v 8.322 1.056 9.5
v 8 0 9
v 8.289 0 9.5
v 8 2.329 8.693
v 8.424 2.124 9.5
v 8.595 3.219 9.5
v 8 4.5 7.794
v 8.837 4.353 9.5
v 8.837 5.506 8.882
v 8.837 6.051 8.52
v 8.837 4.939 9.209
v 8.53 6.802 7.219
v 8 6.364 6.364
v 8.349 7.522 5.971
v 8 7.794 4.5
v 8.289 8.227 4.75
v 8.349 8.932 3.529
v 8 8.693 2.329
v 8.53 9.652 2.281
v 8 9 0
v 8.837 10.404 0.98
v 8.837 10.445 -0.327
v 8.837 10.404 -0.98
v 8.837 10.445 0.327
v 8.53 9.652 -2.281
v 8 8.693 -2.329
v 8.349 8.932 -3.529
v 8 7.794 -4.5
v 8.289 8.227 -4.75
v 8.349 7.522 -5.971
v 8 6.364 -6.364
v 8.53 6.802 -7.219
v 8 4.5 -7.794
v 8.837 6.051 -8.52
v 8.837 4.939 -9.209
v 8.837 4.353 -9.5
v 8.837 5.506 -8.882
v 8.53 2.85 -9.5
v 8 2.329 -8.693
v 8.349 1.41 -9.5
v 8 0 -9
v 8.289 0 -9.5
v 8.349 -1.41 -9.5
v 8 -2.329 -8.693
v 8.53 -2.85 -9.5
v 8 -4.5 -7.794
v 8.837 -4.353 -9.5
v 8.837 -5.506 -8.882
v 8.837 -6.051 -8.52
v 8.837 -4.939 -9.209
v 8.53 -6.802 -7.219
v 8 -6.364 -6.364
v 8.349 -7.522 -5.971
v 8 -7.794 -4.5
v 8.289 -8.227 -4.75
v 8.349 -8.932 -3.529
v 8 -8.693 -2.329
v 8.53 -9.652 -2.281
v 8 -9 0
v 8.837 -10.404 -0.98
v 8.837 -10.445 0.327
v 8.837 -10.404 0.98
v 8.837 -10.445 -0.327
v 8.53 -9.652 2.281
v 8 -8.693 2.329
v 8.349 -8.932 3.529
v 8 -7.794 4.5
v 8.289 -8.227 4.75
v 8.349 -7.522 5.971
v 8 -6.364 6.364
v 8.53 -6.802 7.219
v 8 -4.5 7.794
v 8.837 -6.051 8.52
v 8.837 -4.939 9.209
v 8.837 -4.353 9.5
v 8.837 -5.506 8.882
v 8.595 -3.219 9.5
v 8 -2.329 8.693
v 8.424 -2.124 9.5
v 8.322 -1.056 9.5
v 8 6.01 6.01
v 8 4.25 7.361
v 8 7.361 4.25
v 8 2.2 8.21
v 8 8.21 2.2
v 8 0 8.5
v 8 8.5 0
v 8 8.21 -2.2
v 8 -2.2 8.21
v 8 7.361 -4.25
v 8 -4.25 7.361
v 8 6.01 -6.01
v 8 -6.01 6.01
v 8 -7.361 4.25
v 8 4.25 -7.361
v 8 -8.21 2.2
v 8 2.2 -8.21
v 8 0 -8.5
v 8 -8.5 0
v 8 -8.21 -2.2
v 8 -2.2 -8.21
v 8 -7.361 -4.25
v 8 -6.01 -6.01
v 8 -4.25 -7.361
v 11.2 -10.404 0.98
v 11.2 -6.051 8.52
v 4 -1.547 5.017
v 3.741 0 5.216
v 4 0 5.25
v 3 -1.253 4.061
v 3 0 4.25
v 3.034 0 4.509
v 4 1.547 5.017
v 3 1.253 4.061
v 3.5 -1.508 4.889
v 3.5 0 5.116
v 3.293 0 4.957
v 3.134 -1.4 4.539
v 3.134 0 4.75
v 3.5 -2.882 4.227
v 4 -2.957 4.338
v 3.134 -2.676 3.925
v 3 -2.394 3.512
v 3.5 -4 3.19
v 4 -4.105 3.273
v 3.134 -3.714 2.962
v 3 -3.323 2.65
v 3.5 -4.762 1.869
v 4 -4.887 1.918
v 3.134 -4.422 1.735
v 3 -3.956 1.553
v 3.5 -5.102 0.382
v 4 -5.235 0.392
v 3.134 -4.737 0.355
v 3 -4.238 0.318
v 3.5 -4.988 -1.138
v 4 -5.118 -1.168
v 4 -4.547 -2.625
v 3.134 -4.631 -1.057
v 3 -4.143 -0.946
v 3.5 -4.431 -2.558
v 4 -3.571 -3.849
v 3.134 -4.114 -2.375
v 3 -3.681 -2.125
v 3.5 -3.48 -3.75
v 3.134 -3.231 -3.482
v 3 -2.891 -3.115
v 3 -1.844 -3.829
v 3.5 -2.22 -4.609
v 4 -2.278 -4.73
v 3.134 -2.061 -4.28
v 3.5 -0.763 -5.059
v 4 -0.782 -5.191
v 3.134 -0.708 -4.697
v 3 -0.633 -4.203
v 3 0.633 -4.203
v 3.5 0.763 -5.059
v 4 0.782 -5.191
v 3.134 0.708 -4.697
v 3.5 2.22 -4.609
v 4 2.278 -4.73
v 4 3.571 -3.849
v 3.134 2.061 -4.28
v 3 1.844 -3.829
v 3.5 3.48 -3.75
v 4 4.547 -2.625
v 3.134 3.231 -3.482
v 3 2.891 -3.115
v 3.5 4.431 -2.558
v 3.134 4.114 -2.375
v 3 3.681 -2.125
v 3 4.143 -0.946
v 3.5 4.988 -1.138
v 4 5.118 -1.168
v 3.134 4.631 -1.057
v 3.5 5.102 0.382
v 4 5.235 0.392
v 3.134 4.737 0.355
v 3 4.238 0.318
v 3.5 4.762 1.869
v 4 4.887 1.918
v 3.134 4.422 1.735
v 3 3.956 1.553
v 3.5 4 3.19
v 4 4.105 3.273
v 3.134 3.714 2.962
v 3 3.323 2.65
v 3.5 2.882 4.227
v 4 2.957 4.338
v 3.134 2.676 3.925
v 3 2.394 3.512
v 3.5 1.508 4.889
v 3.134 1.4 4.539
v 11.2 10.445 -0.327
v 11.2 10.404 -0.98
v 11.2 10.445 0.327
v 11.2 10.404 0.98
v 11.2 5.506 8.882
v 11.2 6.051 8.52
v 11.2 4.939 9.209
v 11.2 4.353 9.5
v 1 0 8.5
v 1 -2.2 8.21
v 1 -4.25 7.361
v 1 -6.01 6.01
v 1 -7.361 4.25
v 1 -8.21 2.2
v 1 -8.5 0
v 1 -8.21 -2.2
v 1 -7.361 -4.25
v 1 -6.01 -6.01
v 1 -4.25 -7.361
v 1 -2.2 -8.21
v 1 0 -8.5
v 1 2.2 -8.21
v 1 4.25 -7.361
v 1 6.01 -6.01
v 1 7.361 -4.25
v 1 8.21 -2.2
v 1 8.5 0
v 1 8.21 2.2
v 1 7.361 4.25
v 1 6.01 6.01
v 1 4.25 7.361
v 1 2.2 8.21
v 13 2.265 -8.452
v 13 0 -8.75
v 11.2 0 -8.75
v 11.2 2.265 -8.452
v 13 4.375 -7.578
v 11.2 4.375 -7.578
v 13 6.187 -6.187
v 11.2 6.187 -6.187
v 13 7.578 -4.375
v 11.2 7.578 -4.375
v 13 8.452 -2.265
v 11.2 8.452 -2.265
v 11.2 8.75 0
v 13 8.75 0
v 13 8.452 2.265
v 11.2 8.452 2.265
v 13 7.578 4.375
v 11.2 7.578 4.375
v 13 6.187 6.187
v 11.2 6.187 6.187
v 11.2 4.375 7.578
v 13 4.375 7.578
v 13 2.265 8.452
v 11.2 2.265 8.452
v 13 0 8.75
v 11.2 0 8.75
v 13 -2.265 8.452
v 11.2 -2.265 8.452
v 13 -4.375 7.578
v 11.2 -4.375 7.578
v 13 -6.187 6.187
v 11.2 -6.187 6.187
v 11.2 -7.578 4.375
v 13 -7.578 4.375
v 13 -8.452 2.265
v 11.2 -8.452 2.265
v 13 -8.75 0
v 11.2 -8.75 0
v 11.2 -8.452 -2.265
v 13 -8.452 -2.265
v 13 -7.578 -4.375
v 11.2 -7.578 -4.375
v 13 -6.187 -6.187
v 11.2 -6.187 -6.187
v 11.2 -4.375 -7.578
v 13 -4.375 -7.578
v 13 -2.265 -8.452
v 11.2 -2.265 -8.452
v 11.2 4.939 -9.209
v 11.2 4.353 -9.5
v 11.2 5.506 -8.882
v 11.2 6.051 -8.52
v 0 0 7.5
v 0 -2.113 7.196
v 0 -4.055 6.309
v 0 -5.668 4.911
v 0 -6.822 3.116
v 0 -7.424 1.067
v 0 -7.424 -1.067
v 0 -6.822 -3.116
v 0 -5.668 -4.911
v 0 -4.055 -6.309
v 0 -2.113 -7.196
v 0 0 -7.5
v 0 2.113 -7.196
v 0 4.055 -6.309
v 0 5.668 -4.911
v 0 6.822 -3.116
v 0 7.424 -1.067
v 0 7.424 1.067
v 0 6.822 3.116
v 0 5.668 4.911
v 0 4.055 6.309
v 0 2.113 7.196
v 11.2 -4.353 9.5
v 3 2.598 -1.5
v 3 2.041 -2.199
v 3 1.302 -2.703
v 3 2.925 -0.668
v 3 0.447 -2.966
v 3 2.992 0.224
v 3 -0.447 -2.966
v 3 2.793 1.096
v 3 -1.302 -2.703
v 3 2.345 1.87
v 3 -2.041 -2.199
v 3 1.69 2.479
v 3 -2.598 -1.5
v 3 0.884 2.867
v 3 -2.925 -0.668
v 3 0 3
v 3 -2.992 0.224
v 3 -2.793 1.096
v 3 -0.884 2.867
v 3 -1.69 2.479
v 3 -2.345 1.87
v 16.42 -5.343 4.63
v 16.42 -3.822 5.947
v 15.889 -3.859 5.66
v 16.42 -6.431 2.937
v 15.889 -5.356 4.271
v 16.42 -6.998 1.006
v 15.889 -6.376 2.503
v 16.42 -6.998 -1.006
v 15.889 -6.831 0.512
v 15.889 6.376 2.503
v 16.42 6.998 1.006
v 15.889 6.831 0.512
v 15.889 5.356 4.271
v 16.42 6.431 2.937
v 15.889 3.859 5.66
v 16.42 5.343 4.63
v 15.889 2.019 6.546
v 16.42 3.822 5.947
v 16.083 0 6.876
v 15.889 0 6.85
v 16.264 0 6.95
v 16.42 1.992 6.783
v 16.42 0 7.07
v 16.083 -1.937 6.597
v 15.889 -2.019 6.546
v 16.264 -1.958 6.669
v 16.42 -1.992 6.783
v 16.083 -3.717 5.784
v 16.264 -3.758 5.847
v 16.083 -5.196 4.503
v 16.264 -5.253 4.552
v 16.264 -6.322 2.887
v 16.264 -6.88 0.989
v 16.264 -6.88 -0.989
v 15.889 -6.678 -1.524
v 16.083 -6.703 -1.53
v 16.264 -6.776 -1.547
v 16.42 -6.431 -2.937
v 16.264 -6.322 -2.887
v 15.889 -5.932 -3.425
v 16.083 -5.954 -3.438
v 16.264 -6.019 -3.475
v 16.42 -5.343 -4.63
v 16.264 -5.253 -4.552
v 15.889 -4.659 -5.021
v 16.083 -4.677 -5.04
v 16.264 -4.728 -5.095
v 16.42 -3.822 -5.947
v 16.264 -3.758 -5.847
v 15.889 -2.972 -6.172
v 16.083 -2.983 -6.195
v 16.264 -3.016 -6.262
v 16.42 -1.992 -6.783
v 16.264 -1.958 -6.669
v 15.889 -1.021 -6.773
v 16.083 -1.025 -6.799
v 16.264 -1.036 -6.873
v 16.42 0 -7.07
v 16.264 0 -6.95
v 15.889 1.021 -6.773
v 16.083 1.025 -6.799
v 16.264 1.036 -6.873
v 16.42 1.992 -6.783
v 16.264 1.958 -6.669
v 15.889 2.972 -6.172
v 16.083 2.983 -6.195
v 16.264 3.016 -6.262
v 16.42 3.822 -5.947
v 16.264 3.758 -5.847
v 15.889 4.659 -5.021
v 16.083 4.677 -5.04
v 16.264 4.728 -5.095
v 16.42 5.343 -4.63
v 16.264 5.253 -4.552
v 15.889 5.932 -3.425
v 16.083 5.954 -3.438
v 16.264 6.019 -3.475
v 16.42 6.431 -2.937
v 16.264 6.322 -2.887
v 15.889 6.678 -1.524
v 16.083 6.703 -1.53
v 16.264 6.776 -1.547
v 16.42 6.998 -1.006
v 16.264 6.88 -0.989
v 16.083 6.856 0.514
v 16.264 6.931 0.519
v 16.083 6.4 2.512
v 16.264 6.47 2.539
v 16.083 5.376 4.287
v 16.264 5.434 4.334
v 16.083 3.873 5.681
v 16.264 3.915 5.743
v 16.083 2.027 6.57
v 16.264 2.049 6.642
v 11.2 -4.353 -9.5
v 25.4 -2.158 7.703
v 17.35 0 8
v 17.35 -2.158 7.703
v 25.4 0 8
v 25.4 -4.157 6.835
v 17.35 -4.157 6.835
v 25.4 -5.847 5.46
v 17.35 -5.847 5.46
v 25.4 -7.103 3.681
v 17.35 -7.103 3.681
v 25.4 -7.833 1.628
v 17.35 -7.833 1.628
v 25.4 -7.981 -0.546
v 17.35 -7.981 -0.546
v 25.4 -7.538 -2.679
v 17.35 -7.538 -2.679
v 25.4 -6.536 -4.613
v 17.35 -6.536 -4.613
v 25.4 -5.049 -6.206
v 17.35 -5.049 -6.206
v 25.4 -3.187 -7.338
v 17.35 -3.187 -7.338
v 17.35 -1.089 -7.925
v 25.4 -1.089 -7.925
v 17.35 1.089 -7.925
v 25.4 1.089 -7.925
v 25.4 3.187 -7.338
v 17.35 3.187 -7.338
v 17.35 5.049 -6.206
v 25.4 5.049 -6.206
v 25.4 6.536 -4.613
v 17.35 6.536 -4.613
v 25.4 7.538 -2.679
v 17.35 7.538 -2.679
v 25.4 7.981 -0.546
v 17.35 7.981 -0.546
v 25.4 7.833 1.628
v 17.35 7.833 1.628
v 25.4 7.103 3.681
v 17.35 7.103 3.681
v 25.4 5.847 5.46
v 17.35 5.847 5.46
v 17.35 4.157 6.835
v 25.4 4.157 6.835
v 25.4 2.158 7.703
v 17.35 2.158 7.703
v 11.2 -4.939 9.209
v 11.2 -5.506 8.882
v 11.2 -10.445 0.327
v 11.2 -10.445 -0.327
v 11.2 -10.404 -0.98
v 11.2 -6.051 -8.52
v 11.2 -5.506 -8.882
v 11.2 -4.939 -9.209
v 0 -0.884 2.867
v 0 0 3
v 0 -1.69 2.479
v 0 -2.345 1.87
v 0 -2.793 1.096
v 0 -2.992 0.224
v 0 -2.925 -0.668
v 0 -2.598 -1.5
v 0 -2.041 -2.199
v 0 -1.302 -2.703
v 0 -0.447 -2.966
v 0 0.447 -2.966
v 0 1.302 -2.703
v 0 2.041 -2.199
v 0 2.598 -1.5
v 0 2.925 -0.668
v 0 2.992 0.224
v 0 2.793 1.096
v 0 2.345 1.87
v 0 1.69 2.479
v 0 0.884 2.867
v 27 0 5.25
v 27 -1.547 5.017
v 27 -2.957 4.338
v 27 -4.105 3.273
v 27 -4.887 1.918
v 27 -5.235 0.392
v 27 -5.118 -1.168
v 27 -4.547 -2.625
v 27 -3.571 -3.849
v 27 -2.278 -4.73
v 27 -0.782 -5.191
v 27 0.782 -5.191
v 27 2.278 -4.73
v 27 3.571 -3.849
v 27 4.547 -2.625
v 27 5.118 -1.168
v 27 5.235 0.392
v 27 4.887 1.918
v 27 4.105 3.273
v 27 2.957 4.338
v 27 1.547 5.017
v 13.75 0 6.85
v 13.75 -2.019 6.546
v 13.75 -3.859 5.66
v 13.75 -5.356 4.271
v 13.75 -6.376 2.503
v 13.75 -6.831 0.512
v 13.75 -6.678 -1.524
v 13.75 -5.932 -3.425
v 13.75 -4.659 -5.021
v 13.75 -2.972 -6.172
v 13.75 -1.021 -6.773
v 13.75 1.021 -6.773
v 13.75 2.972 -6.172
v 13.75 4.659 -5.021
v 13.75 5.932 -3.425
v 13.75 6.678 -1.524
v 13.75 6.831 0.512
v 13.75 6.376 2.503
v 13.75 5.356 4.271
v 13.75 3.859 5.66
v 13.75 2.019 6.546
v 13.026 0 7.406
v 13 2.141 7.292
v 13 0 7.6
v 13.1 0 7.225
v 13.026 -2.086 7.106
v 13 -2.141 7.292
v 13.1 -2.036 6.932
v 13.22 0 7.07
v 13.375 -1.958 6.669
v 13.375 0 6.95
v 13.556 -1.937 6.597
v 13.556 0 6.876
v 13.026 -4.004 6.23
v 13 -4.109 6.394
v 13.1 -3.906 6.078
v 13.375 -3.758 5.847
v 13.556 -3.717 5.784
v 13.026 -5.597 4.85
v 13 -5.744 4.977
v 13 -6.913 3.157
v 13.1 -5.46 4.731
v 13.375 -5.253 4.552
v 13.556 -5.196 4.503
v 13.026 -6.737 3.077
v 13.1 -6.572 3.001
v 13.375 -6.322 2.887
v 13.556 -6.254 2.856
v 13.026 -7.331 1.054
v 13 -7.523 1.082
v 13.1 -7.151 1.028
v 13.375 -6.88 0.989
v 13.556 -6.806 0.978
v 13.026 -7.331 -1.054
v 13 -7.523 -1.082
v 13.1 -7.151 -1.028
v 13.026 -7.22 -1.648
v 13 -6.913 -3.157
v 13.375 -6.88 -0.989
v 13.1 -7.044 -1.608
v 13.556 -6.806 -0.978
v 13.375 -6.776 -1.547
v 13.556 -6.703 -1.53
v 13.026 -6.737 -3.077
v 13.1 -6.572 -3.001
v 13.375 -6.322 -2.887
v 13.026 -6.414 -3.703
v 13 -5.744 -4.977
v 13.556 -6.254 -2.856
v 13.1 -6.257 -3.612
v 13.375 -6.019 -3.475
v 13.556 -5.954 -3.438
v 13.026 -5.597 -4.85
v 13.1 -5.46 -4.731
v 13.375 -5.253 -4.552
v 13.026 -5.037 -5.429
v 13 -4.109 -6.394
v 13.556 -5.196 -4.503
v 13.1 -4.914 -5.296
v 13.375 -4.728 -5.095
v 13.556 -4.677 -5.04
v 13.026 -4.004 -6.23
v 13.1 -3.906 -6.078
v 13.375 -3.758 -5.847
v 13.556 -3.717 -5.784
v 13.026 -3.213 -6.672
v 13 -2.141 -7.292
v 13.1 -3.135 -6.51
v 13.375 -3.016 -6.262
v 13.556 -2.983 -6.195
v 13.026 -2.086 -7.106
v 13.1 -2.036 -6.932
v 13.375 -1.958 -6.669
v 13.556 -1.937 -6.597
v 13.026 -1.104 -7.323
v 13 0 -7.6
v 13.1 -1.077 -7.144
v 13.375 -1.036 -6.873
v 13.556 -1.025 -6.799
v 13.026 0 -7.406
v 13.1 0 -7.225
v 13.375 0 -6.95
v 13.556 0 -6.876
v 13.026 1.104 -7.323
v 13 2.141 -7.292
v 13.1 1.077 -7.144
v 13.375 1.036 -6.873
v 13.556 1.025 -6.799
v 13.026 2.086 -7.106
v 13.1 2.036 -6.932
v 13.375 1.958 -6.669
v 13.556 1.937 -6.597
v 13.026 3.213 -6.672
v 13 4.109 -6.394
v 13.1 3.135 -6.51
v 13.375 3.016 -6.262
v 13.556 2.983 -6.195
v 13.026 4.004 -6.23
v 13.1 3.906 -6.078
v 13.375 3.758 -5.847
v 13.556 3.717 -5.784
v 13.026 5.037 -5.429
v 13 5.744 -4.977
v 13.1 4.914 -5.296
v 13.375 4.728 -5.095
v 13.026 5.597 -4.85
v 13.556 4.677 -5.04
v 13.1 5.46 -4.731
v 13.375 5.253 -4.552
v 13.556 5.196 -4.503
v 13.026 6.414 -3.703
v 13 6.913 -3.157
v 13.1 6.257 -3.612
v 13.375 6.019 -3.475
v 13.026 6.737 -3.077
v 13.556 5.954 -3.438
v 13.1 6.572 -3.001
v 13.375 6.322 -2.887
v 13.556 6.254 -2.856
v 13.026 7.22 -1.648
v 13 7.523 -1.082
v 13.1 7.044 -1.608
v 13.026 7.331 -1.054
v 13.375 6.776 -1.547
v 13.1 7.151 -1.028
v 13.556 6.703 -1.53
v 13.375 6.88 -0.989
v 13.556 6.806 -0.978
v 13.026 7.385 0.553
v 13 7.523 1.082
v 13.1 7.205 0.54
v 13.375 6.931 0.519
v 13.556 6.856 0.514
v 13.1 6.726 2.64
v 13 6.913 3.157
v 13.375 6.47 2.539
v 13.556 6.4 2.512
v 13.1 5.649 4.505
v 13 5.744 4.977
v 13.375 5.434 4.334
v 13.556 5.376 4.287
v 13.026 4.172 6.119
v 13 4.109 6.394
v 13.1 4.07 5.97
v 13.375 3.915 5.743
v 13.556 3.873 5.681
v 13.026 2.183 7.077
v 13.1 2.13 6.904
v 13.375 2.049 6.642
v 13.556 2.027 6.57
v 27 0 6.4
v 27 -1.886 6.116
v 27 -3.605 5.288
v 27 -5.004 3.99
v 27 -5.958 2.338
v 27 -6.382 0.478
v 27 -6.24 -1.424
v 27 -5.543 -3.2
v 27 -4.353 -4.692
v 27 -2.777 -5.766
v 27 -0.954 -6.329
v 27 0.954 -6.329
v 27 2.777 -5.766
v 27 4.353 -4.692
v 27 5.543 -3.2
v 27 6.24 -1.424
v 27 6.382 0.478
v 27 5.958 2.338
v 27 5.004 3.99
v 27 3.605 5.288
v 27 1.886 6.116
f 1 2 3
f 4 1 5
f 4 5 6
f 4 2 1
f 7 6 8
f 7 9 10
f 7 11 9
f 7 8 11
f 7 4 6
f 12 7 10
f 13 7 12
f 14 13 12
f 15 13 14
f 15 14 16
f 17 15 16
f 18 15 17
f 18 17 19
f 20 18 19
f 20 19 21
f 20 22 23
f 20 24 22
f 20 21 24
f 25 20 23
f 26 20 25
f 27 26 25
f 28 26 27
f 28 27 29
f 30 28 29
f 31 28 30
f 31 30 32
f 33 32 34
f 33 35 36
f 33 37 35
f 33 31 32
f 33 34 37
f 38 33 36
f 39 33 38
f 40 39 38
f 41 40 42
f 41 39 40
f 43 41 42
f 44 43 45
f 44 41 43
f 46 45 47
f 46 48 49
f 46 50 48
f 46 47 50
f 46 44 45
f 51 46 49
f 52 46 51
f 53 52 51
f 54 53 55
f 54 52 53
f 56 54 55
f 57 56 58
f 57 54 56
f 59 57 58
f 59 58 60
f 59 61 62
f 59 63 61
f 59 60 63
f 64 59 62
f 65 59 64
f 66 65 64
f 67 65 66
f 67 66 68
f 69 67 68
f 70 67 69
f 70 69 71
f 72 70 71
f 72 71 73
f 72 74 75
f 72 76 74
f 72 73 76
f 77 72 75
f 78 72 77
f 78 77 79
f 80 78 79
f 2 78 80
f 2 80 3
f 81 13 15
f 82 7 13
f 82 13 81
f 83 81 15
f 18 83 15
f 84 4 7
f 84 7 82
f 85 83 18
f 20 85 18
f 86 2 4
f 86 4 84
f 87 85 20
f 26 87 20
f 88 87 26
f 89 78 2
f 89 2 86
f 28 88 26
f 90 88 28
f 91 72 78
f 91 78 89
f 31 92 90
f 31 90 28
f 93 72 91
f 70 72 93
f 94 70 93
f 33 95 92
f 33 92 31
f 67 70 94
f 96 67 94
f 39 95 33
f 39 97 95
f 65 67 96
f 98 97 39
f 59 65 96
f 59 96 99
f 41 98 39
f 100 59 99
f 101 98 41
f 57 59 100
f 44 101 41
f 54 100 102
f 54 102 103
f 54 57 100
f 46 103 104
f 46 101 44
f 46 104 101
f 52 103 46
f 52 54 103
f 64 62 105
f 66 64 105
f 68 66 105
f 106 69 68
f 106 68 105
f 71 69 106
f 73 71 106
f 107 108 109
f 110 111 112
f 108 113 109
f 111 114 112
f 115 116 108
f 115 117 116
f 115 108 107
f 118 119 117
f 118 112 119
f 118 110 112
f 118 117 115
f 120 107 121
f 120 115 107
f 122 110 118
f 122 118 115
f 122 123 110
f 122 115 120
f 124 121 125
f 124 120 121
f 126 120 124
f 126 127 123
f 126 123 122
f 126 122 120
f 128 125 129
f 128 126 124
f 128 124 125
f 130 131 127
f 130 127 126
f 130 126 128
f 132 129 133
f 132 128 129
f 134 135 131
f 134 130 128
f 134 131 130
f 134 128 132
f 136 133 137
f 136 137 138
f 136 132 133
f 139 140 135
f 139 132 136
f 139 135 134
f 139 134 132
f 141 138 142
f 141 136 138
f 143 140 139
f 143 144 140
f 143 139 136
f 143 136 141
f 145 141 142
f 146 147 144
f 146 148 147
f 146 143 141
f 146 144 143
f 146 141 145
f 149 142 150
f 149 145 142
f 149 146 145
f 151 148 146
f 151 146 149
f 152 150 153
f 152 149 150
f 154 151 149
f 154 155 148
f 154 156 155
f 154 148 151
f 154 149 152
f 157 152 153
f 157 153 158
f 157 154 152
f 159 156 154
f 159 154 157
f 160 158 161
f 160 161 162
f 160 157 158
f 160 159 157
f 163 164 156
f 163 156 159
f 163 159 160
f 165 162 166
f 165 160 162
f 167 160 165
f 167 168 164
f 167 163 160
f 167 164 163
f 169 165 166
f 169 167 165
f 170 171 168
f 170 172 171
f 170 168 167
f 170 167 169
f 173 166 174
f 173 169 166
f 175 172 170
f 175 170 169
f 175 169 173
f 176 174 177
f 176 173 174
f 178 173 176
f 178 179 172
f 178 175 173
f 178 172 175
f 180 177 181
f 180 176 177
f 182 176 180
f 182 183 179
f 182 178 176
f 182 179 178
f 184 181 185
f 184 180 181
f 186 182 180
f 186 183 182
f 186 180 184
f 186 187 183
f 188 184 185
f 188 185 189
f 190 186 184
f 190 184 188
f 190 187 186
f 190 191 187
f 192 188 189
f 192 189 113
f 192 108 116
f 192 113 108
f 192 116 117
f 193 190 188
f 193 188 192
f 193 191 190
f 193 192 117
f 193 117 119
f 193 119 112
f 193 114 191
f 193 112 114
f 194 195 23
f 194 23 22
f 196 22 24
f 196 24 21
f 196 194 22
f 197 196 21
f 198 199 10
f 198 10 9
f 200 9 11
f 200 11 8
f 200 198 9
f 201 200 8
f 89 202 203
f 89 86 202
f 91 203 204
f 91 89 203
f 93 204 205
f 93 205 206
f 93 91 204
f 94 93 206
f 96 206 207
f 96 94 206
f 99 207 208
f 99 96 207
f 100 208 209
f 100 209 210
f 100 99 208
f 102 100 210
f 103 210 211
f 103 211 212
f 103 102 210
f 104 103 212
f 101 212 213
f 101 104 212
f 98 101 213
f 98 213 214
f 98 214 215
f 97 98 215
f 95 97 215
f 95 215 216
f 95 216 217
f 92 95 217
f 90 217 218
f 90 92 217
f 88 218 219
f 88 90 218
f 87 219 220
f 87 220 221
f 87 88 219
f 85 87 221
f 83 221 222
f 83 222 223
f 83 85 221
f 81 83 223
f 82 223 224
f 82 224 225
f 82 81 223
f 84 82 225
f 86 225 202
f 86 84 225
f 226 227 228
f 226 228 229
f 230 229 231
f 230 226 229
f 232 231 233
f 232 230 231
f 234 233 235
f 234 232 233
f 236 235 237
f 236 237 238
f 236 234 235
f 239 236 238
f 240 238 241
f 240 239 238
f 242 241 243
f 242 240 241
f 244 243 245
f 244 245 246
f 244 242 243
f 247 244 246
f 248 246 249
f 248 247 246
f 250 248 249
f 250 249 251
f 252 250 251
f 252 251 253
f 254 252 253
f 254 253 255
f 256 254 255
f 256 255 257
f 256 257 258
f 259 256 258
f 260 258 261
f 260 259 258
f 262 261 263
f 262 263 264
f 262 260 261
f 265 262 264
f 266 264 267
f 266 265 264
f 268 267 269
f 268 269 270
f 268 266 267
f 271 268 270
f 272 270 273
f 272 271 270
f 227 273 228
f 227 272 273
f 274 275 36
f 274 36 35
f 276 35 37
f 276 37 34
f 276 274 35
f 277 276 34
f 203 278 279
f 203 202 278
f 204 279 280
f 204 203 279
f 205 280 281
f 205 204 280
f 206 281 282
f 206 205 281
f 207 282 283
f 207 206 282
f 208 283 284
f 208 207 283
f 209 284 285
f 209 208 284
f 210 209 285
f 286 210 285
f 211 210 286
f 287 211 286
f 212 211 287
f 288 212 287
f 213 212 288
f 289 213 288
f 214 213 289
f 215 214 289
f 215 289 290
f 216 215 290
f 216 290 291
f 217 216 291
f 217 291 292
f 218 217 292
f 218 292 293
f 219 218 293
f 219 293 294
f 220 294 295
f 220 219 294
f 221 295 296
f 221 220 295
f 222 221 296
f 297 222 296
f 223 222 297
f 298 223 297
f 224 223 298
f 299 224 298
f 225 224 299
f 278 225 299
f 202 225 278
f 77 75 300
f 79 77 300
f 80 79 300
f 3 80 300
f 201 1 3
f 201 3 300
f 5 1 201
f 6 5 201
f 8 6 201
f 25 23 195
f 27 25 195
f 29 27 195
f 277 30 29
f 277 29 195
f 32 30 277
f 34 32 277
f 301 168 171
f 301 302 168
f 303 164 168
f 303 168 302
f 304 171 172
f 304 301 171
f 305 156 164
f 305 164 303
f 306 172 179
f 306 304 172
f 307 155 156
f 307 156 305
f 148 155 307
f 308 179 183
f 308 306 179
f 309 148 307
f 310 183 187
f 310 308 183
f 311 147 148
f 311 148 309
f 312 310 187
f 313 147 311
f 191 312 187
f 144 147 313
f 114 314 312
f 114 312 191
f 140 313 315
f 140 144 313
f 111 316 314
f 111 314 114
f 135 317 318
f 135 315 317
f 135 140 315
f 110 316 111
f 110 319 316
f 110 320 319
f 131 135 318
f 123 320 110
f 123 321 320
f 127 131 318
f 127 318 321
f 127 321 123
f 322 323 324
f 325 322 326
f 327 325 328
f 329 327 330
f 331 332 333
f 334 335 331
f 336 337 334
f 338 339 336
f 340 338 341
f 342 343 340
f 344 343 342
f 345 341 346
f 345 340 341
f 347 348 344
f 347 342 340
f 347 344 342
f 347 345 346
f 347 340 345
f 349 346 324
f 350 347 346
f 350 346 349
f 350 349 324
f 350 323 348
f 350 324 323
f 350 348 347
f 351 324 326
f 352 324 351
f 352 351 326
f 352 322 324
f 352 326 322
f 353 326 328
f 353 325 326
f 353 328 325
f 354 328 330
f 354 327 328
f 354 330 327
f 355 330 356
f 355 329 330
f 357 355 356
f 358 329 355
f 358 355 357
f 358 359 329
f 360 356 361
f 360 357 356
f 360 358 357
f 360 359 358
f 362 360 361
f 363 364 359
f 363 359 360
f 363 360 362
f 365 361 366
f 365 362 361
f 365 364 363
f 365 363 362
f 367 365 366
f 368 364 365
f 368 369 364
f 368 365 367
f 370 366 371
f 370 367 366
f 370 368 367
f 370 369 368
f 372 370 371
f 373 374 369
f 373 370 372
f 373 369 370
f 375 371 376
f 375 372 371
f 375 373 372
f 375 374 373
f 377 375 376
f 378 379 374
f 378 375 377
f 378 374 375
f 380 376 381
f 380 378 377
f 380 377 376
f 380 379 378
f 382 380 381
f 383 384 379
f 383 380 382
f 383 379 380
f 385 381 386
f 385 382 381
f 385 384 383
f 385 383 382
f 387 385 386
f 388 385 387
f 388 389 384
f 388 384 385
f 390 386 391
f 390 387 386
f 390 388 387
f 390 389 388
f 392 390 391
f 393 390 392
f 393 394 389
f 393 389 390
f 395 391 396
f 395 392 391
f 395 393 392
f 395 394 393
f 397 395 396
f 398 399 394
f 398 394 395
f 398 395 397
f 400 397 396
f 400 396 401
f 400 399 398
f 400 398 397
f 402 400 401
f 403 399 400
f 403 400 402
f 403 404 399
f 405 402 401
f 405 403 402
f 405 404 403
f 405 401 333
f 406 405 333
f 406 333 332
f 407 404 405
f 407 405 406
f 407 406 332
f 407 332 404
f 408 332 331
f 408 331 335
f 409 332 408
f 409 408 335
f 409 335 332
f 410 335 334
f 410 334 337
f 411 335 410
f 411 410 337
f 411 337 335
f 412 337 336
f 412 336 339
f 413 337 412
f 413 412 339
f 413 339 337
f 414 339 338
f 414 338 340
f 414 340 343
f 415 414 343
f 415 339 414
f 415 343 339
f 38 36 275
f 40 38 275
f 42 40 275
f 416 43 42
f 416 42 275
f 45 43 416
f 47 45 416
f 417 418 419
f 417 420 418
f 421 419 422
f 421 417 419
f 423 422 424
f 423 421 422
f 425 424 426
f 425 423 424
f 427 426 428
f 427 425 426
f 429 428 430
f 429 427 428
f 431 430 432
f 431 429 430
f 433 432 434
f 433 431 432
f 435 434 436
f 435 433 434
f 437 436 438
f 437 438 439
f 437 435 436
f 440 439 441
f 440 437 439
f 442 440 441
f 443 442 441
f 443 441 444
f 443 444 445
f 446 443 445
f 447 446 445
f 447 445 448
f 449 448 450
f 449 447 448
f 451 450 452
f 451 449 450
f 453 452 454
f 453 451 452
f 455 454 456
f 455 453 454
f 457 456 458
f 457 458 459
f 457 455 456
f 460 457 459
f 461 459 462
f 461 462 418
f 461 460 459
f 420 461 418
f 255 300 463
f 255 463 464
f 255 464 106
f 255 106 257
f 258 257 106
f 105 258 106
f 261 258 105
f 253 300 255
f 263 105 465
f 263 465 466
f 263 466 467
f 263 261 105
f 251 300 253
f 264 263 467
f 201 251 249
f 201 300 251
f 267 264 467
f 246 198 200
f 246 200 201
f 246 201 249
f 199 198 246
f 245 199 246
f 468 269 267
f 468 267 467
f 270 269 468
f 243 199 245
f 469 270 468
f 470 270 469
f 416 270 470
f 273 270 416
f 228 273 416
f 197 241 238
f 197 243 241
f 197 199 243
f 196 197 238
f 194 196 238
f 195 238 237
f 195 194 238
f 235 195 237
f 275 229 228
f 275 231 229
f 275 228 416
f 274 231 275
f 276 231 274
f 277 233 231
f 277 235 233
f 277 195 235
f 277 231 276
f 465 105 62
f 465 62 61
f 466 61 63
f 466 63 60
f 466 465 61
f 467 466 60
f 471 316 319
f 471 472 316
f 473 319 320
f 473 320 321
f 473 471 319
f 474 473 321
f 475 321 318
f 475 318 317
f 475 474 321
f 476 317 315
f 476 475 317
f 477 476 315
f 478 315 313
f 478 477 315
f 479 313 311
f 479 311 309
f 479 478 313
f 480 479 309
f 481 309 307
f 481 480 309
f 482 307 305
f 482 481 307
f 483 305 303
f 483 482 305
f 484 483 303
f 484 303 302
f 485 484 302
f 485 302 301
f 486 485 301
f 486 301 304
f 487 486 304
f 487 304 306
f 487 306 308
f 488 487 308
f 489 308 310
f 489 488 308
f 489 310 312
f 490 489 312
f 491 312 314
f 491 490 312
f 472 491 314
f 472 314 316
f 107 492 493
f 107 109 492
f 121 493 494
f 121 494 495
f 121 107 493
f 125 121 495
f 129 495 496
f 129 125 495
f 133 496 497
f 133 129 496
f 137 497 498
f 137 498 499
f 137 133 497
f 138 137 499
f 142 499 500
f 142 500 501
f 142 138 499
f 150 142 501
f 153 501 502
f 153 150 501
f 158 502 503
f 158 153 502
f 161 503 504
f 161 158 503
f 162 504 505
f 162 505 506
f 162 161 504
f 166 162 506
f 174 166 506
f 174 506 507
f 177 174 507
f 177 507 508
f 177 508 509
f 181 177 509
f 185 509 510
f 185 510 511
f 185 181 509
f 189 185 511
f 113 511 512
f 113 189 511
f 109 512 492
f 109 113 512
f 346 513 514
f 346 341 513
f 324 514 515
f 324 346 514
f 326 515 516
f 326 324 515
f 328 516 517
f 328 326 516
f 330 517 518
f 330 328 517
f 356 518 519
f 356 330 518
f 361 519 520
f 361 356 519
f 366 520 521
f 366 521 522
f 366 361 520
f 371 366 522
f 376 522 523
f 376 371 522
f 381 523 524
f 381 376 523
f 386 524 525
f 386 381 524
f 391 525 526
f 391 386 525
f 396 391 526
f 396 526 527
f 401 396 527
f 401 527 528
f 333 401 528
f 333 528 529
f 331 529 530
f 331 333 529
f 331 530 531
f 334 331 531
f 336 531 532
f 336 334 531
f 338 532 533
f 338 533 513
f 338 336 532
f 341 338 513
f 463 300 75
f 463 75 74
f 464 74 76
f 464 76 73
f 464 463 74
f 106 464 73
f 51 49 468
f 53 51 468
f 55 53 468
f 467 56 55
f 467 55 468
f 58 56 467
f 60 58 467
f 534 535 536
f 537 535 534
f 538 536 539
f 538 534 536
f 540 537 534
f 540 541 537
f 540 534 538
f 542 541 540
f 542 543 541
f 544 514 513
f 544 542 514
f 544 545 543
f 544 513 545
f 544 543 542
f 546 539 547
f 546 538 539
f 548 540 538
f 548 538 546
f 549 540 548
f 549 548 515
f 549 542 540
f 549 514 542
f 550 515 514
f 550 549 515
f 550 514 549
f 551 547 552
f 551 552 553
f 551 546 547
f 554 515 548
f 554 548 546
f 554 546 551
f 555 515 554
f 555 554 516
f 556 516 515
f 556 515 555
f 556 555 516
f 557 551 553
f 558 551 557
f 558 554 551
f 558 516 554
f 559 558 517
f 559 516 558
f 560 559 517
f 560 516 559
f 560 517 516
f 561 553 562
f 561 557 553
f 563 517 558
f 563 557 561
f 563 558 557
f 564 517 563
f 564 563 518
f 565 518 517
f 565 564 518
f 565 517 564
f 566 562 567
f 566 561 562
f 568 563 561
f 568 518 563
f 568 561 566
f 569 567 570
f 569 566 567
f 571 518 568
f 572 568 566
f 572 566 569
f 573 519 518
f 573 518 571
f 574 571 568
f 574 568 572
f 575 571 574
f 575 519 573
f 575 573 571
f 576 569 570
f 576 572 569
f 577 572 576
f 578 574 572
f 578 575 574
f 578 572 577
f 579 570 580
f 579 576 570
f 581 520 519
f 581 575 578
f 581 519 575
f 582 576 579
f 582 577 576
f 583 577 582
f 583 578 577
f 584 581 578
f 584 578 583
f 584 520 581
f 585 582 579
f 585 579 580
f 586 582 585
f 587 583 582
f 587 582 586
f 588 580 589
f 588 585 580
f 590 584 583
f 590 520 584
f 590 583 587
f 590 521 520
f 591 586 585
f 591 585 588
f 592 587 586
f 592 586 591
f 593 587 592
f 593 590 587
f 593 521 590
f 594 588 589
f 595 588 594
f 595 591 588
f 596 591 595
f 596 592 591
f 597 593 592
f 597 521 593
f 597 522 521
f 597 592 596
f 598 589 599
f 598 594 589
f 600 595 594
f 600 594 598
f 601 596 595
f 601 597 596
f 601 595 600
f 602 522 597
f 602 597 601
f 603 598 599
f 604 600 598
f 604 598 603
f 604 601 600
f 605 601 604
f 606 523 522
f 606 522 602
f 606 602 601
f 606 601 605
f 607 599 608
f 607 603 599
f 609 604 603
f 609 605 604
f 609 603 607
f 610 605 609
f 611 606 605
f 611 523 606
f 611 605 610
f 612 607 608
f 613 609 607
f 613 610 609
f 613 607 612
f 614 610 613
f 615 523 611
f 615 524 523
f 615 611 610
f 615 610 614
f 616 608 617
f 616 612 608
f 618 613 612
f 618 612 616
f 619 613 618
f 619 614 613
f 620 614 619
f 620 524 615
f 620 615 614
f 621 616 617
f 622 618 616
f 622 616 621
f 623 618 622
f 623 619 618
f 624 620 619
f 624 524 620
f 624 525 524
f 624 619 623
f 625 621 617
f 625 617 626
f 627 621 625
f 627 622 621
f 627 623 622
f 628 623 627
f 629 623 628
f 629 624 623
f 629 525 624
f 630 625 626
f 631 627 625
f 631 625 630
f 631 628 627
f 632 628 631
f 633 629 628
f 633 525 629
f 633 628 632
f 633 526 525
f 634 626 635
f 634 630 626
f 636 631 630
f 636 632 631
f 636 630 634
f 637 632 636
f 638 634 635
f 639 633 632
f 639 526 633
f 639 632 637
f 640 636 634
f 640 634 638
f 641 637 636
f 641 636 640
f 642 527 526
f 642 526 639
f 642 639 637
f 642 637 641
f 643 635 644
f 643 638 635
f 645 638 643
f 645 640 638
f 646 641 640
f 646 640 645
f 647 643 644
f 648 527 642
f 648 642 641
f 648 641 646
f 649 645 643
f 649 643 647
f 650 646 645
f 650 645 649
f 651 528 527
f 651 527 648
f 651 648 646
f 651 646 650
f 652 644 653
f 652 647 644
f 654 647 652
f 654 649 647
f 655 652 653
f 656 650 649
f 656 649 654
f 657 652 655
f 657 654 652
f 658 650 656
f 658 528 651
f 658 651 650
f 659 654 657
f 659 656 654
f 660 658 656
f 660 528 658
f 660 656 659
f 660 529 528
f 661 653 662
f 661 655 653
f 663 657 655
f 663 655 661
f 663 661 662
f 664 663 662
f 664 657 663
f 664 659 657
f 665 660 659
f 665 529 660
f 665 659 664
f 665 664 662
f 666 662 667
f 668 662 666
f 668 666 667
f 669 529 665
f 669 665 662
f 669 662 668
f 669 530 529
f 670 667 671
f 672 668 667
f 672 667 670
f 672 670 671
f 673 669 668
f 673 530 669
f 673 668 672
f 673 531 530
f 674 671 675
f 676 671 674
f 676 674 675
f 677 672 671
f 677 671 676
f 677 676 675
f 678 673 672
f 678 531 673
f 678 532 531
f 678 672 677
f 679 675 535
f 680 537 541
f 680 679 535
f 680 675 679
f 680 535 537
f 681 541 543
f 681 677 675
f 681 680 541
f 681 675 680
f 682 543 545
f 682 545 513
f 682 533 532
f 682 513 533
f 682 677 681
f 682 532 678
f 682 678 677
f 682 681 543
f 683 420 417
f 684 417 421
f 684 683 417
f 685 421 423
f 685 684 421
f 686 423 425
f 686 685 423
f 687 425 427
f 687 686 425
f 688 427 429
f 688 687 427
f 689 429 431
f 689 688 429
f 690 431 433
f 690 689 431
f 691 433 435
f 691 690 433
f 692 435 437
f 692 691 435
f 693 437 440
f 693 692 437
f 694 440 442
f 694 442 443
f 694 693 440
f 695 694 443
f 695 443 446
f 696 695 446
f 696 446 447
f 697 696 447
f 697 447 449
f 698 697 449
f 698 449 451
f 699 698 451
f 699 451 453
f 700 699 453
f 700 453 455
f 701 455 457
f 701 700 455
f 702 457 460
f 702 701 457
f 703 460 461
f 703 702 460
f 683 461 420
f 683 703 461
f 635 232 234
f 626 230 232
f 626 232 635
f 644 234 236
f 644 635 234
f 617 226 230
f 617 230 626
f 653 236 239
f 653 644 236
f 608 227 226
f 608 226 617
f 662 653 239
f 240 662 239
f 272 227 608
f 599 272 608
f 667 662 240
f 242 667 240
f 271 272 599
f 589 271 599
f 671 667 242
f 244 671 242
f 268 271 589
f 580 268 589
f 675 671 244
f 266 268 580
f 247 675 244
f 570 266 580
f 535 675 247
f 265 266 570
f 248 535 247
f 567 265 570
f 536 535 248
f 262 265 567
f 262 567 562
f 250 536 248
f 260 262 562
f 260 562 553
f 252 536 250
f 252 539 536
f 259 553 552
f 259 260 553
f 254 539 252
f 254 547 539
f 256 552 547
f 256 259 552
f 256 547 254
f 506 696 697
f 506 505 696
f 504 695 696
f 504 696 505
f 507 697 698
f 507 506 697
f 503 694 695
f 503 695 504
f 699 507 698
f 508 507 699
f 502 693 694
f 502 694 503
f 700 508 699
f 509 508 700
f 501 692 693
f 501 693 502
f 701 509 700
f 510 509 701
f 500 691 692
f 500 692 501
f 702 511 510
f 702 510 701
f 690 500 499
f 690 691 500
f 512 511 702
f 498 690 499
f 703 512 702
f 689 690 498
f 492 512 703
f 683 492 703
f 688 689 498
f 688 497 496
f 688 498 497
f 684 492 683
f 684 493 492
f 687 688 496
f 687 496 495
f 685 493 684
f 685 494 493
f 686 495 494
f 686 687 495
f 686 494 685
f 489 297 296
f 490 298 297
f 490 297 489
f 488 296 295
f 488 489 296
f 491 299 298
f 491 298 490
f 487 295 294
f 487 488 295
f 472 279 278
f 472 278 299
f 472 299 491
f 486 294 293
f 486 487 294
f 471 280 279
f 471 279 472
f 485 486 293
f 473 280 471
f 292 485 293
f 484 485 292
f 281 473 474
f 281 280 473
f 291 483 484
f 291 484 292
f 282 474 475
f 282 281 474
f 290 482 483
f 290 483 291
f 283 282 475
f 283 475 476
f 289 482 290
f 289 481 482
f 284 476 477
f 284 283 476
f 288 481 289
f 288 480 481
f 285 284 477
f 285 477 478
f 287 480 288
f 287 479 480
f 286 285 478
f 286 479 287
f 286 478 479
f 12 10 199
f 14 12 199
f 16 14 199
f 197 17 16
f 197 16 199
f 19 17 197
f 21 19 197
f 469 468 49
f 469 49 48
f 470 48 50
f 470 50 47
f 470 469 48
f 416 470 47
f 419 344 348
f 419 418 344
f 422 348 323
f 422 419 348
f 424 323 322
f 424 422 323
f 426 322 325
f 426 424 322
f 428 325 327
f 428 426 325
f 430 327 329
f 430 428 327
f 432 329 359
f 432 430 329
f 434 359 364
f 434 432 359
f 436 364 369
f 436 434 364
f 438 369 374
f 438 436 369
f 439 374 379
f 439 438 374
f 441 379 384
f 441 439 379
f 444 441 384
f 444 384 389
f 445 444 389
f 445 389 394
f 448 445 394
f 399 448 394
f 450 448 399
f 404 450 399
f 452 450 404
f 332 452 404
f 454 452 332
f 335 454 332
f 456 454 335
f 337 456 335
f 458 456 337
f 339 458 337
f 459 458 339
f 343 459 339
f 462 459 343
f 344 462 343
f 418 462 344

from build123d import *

# Parameters (mm, degrees)
SKETCH_2_OUTSIDE_W  = 30.906
SKETCH_2_OUTSIDE_H  = 30.906
CUT_EXTRUDE_1_DEPTH = 25.070832973
SKETCH_3_OUTSIDE_W  = 114.288
SKETCH_3_OUTSIDE_H  = 116.188
SKETCH_3_OUTSIDE_R  = 9
CUT_EXTRUDE_2_DEPTH = 24.673878009
CUT_EXTRUDE_2_DRAFT = -60
SKETCH_4_OUTSIDE_W  = 28.814
SKETCH_4_OUTSIDE_H  = 30.714
SKETCH_4_OUTSIDE_R  = 8.75
CUT_EXTRUDE_3_DEPTH = 1.8


with BuildPart() as part:
    # Эскиз1 → Повернуть1 (revolve)
    with BuildSketch(Plane.XY, mode=Mode.PRIVATE) as revolve_1_sk:
        with BuildLine():
            Line((0, 3), (0, 7.5))
            Line((0, 7.5), (1, 8.5))
            Line((1, 8.5), (8, 8.5))
            Line((8, 8.5), (8, 10.45))
            Line((8, 10.45), (13, 10.45))
            Line((13, 10.45), (13, 7.6))
            ThreePointArc((13, 7.6), (13.219669914, 7.069669914), (13.75, 6.85))
            Line((13.75, 6.85), (15.889339828, 6.85))
            ThreePointArc((15.889339828, 6.85), (16.176352402, 6.907090351), (16.419669914, 7.069669914))
            Line((16.419669914, 7.069669914), (17.35, 8))
            Line((17.35, 8), (25.4, 8))
            Line((25.4, 8), (27, 6.4))
            Line((27, 6.4), (27, 5.25))
            Line((27, 5.25), (4, 5.25))
            ThreePointArc((4, 5.25), (3.292893219, 4.957106781), (3, 4.25))
            Line((3, 4.25), (3, 3))
            Line((3, 3), (0, 3))
        make_face()
    revolve(revolve_1_sk.sketch.rotate(Axis((0, 0, 0), (1, 0, 0)), 90), axis=Axis((0, 0, 0), (1, 0, 0)))

    # Эскиз2 outside → Вырез-Вытянуть1 (cut, through all)
    with BuildSketch(Plane.ZY.offset(-8)):
        Rectangle(SKETCH_2_OUTSIDE_W, SKETCH_2_OUTSIDE_H)
        Polygon((0, 10.969655115), (-9.5, 5.484827557), (-9.5, -5.484827557), (0, -10.969655115), (9.5, -5.484827557), (9.5, 5.484827557), align=None, mode=Mode.SUBTRACT)
    extrude(amount=-CUT_EXTRUDE_1_DEPTH, mode=Mode.SUBTRACT)


with BuildPart() as cut_extrude_2_tool:
    # Эскиз3 outside → Вырез-Вытянуть2 (with draft: the straight prism first)
    with BuildSketch(Plane.ZY.offset(-8)):
        Rectangle(SKETCH_3_OUTSIDE_W, SKETCH_3_OUTSIDE_H)
        Circle(SKETCH_3_OUTSIDE_R, mode=Mode.SUBTRACT)
    extrude(amount=-CUT_EXTRUDE_2_DEPTH)
    # Вырез-Вытянуть2: the draft: its side faces are tilted about the plane it starts from
    cut_extrude_2_sides = [cut_extrude_2_tool.faces().sort_by_distance(p)[0] for p in [
        (20.336939005, -58.094, 0),
        (20.336939005, 0, 57.144),
        (20.336939005, 58.094, 0),
        (20.336939005, 0, -57.144),
        (20.336939005, 0, -9),
    ]]
    draft(cut_extrude_2_sides, Plane.ZY.offset(-8), CUT_EXTRUDE_2_DRAFT)


with BuildPart() as part_1:
    add(part.part)

    # Вырез-Вытянуть2: cut by cut_extrude_2_tool
    add(cut_extrude_2_tool.part, mode=Mode.SUBTRACT)

    # Эскиз4 outside → Вырез-Вытянуть3 (cut)
    with BuildSketch(Plane(origin=(13, 0, 0), x_dir=(0, 0, -1), z_dir=(1, 0, 0))):
        Rectangle(SKETCH_4_OUTSIDE_W, SKETCH_4_OUTSIDE_H)
        Circle(SKETCH_4_OUTSIDE_R, mode=Mode.SUBTRACT)
    extrude(amount=-CUT_EXTRUDE_3_DEPTH, mode=Mode.SUBTRACT)


solid = part_1.part
